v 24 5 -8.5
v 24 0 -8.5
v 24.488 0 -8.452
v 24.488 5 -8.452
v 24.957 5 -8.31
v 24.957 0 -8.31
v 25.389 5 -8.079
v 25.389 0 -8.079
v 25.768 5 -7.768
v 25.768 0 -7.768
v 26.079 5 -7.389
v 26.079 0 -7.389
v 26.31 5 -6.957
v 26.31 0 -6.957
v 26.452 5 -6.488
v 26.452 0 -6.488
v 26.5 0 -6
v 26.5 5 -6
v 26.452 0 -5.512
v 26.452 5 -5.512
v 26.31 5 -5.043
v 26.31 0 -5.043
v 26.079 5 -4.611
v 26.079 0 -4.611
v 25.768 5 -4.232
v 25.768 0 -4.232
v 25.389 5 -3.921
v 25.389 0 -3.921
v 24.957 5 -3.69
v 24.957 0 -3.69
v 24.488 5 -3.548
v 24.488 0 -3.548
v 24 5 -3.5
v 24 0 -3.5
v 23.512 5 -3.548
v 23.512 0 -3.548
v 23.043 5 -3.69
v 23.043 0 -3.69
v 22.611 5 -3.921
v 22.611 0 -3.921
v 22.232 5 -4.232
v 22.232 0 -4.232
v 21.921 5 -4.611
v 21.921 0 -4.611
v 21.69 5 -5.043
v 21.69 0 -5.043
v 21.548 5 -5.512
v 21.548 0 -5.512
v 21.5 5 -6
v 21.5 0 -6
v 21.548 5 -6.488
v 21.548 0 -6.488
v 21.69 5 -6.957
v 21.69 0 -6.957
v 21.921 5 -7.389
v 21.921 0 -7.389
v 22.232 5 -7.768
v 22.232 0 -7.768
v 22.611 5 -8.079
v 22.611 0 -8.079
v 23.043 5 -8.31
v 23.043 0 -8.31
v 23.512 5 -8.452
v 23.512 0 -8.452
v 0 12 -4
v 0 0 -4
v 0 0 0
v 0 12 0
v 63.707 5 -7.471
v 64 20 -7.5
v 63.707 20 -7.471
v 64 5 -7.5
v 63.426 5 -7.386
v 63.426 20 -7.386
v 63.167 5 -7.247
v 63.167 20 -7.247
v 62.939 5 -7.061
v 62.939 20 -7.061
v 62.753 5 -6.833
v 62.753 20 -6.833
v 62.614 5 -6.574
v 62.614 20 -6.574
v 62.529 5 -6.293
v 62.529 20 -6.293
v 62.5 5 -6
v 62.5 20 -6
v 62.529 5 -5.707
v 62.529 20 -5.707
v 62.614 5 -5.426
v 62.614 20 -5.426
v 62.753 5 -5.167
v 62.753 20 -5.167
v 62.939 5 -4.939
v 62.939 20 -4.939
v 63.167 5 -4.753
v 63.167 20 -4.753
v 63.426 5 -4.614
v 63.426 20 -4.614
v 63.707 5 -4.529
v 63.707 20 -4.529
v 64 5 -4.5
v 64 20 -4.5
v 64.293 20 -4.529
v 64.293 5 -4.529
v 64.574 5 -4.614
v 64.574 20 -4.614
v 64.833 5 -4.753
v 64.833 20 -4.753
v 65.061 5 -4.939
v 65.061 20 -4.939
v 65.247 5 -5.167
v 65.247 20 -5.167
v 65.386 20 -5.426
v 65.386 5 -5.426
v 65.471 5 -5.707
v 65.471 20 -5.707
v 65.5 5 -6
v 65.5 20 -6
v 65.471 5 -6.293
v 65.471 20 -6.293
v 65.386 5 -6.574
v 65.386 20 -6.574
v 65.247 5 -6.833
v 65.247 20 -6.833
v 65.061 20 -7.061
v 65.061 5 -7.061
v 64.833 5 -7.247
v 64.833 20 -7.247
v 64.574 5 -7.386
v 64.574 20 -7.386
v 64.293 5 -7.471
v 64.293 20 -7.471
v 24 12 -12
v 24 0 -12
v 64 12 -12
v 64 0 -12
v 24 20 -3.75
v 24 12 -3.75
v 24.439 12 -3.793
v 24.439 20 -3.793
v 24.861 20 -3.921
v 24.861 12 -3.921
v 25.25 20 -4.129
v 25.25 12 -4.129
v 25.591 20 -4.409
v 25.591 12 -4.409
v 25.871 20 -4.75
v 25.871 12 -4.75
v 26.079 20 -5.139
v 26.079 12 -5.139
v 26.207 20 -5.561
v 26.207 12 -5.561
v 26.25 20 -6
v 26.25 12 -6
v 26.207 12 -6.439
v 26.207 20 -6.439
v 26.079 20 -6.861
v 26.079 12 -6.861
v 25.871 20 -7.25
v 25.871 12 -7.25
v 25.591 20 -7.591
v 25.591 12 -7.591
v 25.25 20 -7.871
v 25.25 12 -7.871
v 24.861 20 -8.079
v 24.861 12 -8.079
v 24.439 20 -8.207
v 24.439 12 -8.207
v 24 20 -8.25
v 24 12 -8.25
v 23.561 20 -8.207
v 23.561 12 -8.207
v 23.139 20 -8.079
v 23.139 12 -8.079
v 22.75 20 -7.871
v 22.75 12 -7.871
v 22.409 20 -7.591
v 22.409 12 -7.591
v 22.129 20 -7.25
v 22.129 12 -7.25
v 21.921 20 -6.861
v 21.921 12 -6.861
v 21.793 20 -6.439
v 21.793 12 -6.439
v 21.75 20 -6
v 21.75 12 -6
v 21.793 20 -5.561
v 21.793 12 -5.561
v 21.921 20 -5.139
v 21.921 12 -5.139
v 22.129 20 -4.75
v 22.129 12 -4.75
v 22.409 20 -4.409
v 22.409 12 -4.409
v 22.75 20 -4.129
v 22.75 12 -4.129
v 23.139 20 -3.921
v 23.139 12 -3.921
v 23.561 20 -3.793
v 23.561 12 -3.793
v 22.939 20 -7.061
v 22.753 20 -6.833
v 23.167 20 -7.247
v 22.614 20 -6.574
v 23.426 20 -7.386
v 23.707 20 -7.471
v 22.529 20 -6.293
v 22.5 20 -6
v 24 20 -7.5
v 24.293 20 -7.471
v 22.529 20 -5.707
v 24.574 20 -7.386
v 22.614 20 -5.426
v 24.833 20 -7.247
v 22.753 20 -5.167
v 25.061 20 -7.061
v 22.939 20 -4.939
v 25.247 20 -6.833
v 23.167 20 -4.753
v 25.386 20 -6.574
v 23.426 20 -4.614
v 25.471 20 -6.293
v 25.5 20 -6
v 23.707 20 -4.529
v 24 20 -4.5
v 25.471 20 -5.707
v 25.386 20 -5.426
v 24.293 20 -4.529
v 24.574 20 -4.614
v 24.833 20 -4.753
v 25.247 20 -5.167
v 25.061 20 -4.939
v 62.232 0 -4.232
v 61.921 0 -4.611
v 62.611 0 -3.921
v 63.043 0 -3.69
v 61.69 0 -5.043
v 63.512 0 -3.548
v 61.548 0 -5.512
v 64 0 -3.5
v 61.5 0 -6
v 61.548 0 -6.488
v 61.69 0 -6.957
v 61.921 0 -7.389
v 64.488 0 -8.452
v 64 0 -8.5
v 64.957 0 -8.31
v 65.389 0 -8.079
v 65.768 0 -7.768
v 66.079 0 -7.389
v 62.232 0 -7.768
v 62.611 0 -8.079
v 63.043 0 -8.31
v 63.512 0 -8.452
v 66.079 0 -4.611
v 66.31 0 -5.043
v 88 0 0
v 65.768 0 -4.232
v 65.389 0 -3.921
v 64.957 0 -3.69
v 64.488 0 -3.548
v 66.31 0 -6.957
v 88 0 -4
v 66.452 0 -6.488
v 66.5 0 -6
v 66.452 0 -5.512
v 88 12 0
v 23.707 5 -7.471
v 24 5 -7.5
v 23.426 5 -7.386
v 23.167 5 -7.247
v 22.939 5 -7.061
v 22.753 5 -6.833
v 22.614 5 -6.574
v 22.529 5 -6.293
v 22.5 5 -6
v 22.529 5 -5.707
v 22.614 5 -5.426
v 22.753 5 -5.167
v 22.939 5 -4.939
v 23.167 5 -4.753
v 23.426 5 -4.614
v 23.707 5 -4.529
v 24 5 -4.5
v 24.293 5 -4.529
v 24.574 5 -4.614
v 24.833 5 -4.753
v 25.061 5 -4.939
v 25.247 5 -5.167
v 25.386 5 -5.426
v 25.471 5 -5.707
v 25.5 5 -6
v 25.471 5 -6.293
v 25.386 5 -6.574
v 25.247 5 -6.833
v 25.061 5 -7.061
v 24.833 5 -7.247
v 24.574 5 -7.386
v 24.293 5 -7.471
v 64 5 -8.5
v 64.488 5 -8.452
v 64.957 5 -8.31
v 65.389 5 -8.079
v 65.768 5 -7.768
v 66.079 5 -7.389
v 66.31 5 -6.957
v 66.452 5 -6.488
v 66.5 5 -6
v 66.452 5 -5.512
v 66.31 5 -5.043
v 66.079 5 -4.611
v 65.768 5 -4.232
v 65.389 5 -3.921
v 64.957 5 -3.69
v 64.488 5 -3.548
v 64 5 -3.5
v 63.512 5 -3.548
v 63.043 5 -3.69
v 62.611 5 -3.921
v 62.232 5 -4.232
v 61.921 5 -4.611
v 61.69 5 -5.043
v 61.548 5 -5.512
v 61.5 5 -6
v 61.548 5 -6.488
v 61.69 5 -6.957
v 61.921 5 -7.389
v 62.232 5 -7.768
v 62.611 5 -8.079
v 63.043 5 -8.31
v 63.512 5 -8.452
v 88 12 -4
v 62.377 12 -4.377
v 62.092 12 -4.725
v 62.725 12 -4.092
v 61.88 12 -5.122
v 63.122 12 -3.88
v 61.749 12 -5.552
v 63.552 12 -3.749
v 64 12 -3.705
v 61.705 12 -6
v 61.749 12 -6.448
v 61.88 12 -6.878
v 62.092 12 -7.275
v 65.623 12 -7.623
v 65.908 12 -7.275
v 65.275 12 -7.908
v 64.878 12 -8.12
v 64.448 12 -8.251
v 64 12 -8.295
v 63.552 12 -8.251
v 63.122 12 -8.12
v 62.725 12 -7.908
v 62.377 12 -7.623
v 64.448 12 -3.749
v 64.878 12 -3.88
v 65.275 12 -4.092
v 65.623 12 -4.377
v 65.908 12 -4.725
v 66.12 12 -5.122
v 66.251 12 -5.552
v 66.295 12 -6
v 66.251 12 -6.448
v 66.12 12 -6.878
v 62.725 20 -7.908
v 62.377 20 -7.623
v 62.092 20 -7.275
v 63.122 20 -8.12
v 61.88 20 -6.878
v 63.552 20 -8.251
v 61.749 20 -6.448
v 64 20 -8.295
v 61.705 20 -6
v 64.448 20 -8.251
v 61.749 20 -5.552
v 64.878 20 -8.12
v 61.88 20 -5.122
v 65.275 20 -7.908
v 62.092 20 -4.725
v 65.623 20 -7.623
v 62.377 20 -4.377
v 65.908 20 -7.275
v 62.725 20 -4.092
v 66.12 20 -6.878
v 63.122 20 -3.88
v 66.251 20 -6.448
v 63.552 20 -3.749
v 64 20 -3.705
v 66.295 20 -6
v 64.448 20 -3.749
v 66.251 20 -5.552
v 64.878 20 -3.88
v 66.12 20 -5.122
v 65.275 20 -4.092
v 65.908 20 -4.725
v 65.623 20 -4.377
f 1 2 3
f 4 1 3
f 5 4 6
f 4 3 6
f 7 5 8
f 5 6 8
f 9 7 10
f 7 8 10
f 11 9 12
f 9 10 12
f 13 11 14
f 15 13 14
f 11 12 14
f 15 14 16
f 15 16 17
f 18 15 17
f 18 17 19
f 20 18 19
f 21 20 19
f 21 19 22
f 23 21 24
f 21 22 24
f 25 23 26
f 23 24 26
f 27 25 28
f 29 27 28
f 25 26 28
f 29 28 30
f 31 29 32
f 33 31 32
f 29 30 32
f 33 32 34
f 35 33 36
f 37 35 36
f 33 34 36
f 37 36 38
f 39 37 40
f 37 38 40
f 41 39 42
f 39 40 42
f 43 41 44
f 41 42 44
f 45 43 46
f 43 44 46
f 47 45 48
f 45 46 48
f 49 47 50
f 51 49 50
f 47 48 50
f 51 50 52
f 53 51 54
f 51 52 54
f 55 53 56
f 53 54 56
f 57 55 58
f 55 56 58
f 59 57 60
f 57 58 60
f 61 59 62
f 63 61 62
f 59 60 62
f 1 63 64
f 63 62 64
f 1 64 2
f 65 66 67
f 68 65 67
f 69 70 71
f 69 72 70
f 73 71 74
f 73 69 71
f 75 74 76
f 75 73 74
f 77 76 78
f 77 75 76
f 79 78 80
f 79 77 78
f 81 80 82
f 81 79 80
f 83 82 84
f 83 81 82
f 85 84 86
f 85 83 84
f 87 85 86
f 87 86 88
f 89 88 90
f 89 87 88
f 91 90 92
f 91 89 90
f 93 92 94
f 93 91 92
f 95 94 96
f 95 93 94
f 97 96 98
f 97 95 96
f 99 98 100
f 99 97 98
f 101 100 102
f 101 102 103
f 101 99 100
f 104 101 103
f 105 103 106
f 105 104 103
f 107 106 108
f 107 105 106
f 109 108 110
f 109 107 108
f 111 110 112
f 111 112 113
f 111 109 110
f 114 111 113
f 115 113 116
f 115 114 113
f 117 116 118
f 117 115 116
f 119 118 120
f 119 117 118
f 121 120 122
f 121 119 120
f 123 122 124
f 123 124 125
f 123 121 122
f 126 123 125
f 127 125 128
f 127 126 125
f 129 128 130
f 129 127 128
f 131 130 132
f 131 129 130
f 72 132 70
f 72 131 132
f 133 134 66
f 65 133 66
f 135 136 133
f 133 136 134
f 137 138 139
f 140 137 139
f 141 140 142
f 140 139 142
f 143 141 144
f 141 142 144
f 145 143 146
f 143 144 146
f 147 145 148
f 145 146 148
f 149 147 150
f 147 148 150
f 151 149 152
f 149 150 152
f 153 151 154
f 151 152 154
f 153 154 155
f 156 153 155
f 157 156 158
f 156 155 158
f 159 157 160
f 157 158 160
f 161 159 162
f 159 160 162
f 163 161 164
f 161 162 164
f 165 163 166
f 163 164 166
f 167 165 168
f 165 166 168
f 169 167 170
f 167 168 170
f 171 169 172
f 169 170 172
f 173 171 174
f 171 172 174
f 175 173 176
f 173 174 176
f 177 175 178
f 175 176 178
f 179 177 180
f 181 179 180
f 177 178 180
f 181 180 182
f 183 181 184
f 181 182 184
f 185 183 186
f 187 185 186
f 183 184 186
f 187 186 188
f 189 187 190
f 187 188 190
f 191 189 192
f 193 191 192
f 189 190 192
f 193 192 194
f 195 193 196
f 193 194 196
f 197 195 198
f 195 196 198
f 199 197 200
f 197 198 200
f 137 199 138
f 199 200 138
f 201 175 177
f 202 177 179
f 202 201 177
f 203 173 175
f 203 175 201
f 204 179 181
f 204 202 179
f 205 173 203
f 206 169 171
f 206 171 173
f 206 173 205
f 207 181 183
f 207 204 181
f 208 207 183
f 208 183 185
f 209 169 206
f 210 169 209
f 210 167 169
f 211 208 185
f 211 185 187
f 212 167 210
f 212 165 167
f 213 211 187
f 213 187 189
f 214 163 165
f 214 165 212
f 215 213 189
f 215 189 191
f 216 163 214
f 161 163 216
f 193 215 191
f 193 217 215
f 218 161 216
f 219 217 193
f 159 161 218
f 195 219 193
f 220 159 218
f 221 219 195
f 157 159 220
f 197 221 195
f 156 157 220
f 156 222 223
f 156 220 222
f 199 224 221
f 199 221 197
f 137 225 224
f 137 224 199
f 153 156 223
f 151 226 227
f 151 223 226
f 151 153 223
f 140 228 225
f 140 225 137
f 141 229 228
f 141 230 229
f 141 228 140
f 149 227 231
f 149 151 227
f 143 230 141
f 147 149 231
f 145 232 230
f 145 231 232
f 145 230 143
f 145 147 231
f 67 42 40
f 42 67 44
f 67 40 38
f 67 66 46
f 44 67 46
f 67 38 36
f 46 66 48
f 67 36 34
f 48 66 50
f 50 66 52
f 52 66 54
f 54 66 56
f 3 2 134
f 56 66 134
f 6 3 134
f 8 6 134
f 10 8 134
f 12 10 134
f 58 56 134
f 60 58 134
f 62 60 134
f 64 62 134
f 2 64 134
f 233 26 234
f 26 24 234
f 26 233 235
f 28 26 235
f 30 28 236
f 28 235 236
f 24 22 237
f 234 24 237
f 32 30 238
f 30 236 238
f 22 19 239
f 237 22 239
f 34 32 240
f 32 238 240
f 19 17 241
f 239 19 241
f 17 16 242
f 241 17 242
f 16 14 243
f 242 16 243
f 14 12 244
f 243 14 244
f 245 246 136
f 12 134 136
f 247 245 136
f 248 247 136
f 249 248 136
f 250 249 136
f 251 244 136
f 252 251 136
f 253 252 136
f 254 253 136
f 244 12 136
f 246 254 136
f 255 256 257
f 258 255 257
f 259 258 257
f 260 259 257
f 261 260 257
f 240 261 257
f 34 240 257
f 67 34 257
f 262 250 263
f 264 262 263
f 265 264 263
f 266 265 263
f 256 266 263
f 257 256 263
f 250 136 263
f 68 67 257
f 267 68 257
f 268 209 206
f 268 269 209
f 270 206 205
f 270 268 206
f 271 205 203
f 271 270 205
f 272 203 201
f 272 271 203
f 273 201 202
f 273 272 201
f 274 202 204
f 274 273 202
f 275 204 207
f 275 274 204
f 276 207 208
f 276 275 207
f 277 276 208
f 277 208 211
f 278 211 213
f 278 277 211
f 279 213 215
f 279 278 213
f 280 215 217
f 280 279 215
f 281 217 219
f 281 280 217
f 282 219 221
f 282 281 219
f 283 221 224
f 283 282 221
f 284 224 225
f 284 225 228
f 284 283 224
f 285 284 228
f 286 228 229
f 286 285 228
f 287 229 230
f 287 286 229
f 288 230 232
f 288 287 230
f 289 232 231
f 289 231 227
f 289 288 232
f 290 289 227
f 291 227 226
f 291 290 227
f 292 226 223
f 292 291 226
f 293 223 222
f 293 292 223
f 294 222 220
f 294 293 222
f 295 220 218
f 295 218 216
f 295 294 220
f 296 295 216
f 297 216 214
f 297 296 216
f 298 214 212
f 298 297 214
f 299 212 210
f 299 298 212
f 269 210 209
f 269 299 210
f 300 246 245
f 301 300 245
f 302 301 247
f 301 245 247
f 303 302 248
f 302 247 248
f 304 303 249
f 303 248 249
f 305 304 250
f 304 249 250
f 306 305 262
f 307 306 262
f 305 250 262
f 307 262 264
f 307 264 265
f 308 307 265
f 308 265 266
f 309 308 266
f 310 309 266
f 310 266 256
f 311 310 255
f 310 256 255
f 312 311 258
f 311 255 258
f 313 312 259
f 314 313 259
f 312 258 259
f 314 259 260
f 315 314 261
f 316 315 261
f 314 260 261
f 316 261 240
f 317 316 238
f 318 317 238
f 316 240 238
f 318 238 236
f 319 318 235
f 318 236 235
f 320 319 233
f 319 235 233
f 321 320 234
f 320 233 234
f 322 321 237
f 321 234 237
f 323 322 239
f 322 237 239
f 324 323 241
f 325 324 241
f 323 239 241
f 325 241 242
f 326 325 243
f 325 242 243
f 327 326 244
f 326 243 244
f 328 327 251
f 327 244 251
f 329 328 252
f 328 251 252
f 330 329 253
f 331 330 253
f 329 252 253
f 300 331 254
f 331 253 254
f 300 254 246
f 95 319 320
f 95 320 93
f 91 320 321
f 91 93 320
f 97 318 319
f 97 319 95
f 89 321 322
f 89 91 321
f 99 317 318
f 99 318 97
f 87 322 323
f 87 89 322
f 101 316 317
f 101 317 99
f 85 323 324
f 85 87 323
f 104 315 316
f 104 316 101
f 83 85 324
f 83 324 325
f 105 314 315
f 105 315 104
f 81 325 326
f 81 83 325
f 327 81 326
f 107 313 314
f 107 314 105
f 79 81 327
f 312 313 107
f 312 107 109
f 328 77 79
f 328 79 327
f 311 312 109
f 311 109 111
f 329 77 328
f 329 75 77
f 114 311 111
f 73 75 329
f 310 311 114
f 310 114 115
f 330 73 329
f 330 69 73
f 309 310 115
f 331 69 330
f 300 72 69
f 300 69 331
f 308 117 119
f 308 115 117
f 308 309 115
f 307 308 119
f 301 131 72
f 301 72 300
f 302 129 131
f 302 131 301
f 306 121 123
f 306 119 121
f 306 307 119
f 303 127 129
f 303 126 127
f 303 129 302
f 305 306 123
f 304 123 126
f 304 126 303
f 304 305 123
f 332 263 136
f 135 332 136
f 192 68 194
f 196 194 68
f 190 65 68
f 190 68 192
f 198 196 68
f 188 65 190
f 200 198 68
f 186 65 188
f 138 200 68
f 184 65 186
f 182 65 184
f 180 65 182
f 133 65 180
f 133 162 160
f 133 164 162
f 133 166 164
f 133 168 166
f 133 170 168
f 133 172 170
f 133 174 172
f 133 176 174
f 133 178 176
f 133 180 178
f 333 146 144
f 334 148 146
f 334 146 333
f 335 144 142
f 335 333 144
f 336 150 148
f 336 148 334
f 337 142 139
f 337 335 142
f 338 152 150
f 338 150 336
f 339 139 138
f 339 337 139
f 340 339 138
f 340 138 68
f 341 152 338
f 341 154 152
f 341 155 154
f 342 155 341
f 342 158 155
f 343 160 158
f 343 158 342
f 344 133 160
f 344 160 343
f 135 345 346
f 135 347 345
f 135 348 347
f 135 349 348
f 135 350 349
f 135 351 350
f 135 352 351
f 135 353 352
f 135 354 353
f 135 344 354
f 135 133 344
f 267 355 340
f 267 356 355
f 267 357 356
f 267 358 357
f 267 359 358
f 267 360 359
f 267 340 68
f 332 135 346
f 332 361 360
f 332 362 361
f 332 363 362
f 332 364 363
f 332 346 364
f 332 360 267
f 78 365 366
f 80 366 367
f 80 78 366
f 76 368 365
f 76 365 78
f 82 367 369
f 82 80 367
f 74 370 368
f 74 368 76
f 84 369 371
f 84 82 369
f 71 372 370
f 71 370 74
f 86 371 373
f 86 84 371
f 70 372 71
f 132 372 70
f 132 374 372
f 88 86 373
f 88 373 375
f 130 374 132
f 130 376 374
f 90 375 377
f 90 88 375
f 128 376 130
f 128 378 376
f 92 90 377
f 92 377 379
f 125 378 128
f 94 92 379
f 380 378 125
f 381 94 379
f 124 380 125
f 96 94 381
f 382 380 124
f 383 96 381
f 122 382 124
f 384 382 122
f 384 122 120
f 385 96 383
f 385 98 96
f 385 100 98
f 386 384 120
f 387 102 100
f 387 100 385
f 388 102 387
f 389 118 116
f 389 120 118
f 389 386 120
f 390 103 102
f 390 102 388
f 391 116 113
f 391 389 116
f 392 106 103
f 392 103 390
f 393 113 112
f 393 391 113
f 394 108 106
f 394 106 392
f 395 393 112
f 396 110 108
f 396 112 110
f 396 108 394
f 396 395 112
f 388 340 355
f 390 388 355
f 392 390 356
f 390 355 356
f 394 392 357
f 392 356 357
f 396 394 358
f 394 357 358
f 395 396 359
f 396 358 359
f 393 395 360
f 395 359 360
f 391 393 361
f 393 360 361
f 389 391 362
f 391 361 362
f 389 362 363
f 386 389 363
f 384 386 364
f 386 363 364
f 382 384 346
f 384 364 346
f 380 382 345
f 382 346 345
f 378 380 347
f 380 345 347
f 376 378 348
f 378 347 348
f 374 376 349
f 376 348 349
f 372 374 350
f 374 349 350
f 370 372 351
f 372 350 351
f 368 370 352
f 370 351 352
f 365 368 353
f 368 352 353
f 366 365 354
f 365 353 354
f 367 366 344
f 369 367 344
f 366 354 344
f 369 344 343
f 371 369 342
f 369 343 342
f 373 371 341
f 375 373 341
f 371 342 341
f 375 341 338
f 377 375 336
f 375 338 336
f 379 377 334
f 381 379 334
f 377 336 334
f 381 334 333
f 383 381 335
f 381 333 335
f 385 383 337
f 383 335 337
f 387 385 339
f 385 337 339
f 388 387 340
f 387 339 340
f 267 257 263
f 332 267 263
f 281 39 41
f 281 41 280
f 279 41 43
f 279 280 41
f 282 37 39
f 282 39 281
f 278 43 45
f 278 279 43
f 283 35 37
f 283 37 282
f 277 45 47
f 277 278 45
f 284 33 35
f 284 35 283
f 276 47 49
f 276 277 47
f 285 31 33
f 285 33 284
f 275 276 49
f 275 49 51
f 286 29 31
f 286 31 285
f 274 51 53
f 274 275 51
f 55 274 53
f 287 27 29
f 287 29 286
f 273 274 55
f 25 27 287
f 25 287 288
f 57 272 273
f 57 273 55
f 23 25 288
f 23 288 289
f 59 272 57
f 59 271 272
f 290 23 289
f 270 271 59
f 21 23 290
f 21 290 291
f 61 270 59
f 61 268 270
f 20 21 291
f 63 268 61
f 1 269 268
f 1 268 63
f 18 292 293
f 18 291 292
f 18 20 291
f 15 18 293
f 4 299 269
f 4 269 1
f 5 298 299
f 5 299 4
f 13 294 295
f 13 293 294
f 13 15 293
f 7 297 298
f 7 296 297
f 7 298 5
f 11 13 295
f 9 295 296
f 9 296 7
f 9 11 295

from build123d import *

# Parameters (mm, degrees)
BOSS_EXTRUDE1_DEPTH = 12
SKETCH2_R           = 2.5
CUT_EXTRUDE1_DEPTH  = 5
SKETCH3_R           = 1.5
CUT_EXTRUDE2_DEPTH  = 90.089842294
SKETCH4_R           = 2.25
SKETCH4_R_2         = 1.5
SKETCH4_R_3         = 2.294622505
BOSS_EXTRUDE2_DEPTH = 8


with BuildPart() as part:
    # Sketch1 → Boss-Extrude1 (new body)
    with BuildSketch(Plane(origin=(0, 0, 0), x_dir=(1, 0, 0), z_dir=(0, 1, 0))):
        Polygon((0, 0), (88, 0), (88, 4), (64, 12), (24, 12), (0, 4), align=None)
    extrude(amount=BOSS_EXTRUDE1_DEPTH)

    # Sketch2 → Cut-Extrude1 (cut)
    with BuildSketch(Plane(origin=(0, 0, 0), x_dir=(-1, 0, 0), z_dir=(0, -1, 0))):
        with Locations(Location((-24, 6, 0), (0, 0, 90))):
            Circle(SKETCH2_R)
        with Locations(Location((-64, 6, 0), (0, 0, 90))):
            Circle(SKETCH2_R)
    extrude(amount=-CUT_EXTRUDE1_DEPTH, mode=Mode.SUBTRACT)

    # Sketch3 → Cut-Extrude2 (cut, through all)
    with BuildSketch(Plane(origin=(0, 5, 0), x_dir=(-1, 0, 0), z_dir=(0, -1, 0))):
        with Locations(Location((-24, 6, 0), (0, 0, 90))):
            Circle(SKETCH3_R)
        with Locations(Location((-64, 6, 0), (0, 0, 90))):
            Circle(SKETCH3_R)
    extrude(amount=-CUT_EXTRUDE2_DEPTH, mode=Mode.SUBTRACT)

    # Sketch4 → Boss-Extrude2 (add)
    with BuildSketch(Plane(origin=(0, 12, 0), x_dir=(1, 0, 0), z_dir=(0, 1, 0))):
        with Locations(Location((24, 6, 0), (0, 0, 270))):
            Circle(SKETCH4_R)
        with Locations(Location((24, 6, 0), (0, 0, 90))):
            Circle(SKETCH4_R_2, mode=Mode.SUBTRACT)
        with Locations(Location((64, 6, 0), (0, 0, 270))):
            Circle(SKETCH4_R_3)
        with Locations(Location((64, 6, 0), (0, 0, 90))):
            Circle(SKETCH4_R_2, mode=Mode.SUBTRACT)
    extrude(amount=BOSS_EXTRUDE2_DEPTH)


solid = part.part
